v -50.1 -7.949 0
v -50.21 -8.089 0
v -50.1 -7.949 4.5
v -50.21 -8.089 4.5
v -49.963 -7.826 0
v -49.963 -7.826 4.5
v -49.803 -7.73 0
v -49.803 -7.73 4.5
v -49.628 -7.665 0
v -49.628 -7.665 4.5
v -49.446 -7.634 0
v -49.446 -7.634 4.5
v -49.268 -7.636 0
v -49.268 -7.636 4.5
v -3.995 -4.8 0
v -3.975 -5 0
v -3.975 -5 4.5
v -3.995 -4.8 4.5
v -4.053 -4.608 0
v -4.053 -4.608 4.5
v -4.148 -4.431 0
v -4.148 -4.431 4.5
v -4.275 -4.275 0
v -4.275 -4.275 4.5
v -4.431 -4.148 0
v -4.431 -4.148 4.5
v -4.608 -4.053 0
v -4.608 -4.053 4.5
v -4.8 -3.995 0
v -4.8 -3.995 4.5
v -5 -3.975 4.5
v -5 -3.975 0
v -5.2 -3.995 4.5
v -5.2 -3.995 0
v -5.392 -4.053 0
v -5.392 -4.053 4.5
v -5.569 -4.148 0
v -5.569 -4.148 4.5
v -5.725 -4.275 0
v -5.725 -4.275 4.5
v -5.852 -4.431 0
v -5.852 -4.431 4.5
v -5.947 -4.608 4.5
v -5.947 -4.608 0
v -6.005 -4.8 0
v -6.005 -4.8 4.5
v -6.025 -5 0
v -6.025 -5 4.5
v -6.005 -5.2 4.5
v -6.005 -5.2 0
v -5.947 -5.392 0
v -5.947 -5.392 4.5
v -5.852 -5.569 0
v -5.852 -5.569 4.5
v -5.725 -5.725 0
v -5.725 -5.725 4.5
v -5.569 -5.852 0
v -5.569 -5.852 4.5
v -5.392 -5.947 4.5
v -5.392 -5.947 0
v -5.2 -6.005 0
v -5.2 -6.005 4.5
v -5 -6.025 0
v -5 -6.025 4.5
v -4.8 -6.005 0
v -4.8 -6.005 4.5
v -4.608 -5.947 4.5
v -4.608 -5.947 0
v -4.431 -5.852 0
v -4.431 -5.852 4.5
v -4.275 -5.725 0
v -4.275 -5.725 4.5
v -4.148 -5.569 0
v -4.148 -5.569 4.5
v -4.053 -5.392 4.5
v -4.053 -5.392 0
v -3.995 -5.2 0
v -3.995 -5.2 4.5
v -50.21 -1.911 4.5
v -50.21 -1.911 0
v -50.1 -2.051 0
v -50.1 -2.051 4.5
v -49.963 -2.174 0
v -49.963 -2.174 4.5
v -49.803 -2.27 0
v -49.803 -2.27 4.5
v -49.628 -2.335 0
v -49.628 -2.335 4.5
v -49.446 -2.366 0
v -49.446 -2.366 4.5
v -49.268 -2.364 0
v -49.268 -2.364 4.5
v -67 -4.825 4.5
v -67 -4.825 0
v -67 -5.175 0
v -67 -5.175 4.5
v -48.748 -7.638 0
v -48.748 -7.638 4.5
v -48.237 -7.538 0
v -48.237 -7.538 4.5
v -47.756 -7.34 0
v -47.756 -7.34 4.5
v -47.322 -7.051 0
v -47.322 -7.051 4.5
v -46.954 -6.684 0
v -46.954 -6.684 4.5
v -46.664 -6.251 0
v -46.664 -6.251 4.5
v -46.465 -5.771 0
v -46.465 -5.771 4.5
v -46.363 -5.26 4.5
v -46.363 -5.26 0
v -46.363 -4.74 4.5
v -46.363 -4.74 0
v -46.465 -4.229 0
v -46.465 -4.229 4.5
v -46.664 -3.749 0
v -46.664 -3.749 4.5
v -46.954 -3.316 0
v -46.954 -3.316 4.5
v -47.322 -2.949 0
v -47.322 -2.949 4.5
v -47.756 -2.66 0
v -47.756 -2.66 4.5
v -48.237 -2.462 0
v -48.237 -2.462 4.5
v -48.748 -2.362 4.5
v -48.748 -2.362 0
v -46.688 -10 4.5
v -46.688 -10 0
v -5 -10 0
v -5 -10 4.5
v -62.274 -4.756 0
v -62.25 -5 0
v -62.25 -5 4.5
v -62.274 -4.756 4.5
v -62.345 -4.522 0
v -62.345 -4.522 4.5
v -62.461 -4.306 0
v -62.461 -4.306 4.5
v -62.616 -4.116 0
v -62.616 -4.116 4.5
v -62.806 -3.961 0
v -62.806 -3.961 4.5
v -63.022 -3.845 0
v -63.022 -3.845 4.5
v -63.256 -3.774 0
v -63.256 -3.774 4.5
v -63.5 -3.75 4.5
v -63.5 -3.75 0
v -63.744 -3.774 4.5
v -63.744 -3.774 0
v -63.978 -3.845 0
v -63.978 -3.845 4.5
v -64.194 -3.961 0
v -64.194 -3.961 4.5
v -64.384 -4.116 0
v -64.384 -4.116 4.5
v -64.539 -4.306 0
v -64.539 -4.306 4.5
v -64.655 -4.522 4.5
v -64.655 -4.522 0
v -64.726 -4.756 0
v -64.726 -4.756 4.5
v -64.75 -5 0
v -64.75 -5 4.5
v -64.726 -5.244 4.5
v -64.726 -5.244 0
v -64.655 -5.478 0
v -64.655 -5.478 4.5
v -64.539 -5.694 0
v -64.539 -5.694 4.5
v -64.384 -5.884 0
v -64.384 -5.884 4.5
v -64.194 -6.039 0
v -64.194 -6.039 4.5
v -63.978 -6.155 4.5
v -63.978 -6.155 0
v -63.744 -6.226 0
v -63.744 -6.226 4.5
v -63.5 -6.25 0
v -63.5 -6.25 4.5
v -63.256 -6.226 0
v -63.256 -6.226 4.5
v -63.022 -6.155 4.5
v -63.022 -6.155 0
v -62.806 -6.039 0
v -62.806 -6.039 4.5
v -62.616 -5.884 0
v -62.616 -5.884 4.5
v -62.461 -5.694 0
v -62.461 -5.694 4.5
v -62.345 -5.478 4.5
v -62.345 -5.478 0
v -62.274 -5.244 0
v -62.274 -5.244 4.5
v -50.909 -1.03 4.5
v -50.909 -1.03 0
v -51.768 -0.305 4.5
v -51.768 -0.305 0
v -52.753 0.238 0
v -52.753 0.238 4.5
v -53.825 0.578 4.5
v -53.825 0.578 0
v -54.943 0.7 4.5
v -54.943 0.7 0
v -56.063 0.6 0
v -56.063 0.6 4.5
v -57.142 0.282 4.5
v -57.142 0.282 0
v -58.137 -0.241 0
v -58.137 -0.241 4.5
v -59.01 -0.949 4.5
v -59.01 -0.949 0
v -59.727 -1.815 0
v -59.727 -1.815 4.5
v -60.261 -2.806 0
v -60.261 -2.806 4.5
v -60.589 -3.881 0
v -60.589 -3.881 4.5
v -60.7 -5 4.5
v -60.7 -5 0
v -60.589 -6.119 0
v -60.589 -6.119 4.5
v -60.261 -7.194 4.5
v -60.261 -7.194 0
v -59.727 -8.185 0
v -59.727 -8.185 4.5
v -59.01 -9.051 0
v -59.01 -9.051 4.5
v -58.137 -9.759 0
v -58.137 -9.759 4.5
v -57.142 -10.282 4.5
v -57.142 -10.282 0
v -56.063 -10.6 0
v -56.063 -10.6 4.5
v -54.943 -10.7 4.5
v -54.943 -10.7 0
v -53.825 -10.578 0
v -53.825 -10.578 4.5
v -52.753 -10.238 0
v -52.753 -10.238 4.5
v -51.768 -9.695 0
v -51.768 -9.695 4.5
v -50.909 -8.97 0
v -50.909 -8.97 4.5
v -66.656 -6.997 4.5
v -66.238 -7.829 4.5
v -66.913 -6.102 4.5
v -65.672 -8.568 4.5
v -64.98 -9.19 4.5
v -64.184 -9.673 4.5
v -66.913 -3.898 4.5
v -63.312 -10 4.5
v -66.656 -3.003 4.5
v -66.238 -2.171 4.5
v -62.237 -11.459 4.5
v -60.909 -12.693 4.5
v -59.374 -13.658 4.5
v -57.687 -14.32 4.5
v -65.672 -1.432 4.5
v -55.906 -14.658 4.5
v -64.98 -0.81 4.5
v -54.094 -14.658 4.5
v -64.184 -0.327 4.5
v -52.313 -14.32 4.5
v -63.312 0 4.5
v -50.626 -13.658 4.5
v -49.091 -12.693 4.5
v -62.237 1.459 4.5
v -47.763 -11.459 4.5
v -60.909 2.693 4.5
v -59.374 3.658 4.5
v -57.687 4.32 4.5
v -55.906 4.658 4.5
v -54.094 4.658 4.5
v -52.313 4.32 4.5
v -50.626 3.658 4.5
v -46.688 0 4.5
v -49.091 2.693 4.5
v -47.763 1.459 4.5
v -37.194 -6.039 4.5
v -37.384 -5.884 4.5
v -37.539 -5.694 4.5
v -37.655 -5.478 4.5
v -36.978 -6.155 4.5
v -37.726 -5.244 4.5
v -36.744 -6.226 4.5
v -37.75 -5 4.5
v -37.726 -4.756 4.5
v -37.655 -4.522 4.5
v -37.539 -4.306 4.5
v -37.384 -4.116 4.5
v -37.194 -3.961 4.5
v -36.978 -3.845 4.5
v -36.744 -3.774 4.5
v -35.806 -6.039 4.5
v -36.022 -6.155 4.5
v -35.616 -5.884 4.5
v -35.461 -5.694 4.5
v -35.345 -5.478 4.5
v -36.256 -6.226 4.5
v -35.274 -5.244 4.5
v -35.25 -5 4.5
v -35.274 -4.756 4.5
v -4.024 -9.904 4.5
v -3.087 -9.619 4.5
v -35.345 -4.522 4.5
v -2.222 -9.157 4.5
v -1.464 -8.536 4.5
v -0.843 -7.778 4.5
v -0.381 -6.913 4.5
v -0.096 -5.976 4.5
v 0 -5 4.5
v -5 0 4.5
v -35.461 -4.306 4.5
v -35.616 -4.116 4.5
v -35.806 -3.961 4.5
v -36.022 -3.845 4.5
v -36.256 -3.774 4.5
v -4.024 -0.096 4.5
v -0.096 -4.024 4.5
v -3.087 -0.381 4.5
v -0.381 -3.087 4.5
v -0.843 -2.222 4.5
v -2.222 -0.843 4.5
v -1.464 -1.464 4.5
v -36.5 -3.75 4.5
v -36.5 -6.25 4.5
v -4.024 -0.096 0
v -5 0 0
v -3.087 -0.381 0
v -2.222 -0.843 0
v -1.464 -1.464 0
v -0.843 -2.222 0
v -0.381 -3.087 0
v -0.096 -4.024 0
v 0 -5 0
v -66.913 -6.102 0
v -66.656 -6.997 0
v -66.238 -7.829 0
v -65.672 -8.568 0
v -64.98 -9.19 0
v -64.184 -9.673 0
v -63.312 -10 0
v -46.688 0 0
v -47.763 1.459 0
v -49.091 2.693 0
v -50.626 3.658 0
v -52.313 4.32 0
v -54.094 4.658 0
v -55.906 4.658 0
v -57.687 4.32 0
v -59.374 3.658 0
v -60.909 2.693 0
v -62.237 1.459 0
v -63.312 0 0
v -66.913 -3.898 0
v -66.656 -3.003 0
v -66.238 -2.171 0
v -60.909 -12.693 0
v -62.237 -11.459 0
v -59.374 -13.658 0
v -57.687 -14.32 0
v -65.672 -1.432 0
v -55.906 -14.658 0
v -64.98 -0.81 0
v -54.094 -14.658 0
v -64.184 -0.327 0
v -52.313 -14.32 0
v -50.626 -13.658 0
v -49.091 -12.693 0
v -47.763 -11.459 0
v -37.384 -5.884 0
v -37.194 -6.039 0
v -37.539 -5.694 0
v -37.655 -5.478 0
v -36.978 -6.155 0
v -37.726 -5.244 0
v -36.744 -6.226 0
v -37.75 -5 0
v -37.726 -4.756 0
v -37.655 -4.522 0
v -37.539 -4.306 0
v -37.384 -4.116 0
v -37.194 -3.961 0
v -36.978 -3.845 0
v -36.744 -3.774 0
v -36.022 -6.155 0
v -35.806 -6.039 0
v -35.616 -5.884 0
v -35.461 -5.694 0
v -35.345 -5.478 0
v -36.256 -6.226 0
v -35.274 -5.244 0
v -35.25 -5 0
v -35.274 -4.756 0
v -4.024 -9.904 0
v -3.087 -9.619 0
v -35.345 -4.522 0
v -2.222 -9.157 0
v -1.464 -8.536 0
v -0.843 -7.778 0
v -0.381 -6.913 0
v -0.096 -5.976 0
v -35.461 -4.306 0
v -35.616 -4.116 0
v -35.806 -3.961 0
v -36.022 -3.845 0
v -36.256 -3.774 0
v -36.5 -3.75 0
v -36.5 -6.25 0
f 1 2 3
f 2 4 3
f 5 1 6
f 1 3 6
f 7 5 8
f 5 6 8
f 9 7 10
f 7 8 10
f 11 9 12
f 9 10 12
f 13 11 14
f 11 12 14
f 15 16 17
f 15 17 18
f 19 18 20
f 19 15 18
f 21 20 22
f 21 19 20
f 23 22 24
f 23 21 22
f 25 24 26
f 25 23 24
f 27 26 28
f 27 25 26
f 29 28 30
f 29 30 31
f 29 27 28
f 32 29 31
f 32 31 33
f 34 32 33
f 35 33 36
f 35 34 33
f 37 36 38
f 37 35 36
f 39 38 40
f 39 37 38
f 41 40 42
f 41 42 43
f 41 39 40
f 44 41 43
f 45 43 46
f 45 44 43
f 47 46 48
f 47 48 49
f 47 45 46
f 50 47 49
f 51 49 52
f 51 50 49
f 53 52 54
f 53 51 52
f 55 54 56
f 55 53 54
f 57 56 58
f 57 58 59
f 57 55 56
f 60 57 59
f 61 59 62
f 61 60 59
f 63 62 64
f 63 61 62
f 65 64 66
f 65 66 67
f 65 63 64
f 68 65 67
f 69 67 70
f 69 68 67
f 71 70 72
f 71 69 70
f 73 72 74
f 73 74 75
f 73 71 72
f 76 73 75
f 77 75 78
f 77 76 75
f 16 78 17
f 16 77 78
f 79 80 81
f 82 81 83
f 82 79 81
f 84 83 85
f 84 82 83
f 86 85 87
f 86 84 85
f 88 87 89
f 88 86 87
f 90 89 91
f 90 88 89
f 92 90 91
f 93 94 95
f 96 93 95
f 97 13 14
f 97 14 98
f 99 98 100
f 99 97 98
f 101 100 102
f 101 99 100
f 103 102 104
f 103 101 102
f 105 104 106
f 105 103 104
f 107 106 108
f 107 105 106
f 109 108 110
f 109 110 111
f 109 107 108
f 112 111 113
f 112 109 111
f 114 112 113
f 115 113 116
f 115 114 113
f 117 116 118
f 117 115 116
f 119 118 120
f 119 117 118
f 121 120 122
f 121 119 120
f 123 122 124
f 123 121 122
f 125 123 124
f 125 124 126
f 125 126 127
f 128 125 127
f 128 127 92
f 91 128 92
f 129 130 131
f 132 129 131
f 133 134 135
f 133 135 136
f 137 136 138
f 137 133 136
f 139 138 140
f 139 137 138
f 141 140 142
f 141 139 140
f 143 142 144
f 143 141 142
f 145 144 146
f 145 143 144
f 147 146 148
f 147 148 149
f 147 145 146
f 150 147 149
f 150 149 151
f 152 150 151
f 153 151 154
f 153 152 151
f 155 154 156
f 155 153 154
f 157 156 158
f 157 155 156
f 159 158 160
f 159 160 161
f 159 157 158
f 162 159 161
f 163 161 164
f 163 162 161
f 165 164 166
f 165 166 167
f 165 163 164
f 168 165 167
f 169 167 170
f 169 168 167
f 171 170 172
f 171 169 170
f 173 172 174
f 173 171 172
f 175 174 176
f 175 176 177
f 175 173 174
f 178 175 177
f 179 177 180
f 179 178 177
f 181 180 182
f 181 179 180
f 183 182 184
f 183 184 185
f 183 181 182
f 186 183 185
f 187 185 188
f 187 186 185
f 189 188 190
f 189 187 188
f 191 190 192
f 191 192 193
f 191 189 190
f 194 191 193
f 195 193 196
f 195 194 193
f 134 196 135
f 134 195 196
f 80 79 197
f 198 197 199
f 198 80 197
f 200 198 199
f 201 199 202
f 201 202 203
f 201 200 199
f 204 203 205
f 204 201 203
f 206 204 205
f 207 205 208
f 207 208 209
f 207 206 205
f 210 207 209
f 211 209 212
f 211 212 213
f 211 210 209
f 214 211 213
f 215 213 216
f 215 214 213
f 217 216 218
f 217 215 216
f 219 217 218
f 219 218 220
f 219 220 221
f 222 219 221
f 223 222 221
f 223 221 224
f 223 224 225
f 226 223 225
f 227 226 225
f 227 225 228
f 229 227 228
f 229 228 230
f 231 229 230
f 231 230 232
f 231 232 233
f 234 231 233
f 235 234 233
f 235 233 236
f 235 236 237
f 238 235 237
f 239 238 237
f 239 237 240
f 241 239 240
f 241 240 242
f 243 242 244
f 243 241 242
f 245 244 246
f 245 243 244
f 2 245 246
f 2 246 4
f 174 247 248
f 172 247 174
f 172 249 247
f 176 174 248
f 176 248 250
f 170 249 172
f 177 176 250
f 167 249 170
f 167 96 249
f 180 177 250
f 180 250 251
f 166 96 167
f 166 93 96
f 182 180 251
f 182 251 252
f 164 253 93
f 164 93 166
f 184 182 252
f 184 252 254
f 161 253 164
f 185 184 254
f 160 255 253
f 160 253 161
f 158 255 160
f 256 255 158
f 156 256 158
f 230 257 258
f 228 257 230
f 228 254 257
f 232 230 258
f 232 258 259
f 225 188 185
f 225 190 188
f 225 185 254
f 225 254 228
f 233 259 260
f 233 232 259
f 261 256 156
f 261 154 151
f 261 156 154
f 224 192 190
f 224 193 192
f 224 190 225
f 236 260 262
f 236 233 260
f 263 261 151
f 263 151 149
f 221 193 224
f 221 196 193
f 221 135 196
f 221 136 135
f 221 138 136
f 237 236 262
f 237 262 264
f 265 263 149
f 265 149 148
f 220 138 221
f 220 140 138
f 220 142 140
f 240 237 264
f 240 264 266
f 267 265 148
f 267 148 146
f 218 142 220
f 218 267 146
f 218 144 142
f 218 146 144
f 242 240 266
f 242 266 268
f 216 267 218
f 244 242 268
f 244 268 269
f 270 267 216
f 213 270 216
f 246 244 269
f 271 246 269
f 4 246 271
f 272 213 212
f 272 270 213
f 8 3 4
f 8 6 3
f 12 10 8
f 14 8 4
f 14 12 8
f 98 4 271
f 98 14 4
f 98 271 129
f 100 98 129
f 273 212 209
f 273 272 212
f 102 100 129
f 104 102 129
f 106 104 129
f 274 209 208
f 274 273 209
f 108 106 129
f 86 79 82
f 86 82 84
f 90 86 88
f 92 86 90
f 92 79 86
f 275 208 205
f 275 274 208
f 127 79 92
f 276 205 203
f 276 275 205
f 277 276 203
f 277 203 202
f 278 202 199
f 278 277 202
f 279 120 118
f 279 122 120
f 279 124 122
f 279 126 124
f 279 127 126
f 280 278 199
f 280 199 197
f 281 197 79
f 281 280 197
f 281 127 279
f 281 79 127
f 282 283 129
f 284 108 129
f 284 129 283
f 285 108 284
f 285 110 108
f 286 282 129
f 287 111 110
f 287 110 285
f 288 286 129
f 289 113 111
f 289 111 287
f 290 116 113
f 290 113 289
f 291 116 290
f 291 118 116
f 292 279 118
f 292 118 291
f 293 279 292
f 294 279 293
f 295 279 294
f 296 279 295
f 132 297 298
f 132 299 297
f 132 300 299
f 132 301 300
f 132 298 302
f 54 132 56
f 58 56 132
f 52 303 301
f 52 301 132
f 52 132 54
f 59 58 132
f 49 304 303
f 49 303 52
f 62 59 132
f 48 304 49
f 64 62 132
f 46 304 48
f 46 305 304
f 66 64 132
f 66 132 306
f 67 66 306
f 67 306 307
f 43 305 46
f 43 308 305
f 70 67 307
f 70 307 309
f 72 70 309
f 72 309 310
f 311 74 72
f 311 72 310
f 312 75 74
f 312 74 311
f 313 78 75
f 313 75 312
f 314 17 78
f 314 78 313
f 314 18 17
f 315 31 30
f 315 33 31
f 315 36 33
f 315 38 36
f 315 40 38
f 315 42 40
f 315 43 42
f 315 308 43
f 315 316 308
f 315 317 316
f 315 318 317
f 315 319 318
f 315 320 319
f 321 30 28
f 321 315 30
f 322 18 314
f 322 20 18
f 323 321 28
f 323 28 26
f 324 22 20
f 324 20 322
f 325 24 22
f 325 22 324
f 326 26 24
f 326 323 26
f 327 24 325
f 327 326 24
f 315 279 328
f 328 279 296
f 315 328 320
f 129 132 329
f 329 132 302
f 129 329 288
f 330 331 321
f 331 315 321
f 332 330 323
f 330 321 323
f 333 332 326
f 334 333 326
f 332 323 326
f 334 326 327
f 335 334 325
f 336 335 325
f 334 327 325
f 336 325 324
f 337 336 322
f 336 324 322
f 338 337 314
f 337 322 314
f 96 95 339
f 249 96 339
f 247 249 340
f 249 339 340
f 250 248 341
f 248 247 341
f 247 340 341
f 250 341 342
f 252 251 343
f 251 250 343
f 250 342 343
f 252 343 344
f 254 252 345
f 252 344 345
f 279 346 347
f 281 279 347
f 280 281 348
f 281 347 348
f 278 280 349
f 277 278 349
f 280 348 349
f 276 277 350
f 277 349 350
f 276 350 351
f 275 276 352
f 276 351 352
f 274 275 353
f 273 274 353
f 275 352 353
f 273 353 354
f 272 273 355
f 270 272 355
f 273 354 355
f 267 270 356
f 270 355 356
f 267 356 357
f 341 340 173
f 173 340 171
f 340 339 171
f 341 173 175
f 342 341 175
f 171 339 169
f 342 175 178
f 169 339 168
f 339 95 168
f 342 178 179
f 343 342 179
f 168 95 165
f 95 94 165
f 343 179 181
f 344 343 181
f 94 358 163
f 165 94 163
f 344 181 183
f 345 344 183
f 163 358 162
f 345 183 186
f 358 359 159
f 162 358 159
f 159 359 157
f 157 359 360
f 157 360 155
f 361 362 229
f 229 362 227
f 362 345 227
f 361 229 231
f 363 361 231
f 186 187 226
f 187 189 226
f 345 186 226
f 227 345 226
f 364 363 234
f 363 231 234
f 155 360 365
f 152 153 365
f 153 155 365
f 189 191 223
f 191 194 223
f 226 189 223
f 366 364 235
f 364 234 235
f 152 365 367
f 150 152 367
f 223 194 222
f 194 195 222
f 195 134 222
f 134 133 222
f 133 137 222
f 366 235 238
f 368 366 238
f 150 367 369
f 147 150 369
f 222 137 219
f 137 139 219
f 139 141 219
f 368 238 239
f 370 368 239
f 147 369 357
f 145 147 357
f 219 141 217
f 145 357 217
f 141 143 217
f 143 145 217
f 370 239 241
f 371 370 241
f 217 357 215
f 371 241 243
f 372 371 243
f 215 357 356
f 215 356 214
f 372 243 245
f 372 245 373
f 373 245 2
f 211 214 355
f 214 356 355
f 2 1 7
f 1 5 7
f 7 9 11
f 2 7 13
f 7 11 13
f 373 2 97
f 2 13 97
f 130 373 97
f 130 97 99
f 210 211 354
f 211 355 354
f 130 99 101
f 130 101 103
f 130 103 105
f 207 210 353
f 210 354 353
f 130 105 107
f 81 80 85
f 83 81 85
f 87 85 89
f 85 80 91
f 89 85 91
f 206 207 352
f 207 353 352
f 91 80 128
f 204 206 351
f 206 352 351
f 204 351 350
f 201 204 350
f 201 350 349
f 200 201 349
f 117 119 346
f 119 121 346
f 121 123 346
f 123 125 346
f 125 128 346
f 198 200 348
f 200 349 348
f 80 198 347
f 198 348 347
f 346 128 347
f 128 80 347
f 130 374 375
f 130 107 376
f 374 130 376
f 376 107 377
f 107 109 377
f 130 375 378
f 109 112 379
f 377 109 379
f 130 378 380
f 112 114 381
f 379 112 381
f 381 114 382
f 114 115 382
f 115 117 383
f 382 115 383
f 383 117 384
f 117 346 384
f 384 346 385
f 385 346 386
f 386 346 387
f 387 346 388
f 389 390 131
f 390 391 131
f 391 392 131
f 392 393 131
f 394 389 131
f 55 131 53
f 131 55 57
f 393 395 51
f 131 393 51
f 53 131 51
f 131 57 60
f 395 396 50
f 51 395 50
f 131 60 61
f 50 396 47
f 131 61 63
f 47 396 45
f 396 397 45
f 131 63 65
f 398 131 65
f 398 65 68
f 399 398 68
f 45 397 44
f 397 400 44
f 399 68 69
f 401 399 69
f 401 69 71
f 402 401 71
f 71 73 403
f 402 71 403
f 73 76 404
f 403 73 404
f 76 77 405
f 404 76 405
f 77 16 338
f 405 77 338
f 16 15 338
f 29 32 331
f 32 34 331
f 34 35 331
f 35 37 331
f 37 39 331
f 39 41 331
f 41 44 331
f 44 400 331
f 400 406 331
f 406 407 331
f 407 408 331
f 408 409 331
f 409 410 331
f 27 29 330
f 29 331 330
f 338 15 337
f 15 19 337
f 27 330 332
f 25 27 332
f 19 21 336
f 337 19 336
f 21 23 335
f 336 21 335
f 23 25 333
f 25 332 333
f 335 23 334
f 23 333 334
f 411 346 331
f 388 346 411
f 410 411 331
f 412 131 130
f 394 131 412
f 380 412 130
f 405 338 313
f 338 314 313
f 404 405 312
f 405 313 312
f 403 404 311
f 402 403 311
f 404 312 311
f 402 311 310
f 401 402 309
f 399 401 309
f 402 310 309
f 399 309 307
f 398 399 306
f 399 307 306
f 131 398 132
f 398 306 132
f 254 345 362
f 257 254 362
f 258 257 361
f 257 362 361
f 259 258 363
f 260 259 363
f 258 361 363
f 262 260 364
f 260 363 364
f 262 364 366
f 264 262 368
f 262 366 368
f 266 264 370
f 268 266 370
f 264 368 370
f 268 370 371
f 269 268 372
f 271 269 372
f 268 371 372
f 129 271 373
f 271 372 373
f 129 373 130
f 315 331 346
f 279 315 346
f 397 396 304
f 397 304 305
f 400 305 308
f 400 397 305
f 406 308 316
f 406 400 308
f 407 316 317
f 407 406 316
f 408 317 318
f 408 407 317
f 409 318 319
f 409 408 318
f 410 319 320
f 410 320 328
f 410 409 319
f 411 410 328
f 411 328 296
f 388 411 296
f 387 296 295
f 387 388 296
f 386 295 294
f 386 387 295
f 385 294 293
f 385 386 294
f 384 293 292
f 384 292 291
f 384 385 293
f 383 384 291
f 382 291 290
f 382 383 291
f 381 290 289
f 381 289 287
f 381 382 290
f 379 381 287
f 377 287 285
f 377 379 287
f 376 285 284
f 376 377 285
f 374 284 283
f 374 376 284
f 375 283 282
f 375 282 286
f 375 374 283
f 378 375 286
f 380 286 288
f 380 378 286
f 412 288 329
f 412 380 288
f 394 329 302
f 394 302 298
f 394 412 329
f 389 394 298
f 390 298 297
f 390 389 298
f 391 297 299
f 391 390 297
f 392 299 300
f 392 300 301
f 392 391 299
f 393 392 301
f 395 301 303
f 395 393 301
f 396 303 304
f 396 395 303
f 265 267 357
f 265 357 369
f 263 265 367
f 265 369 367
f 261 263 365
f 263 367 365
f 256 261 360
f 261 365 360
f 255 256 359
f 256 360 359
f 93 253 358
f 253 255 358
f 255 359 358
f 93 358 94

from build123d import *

# Parameters (mm, degrees)
SKETCH_1_R      = 1.025
SKETCH_1_R_2    = 1.25
EXTRUDE_1_DEPTH = 4.5
FILLET_1_R      = 1
FILLET_2_R      = 5
FILLET_3_R      = 5


# Some blends are built 0.0001 mm under size
with BuildPart() as part:
    # 草图1 → 凸台-拉伸1 (new body)
    with BuildSketch(Plane.XY):
        with BuildLine():
            Line((-63.312039461, 0), (-67, 0))
            Line((-67, 0), (-67, -10))
            Line((-67, -10), (-63.312039461, -10))
            ThreePointArc((-63.312039461, -10), (-55, -14.7), (-46.687960539, -10))
            Line((-46.687960539, -10), (0, -10))
            Line((0, -10), (0, 0))
            Line((0, 0), (-46.687960539, 0))
            ThreePointArc((-46.687960539, 0), (-55, 4.7), (-63.312039461, 0))
        make_face()
        with Locations((-5, -5)):
            Circle(SKETCH_1_R, mode=Mode.SUBTRACT)
        with Locations((-63.5, -5)):
            Circle(SKETCH_1_R_2, mode=Mode.SUBTRACT)
        with Locations((-36.5, -5)):
            Circle(SKETCH_1_R_2, mode=Mode.SUBTRACT)
        with BuildLine():
            ThreePointArc((-49.877708333, -2.49957442), (-60.7, -5), (-49.877708333, -7.50042558))
            ThreePointArc((-49.877708333, -7.50042558), (-46.35, -5), (-49.877708333, -2.49957442))
        make_face(mode=Mode.SUBTRACT)
    extrude(amount=EXTRUDE_1_DEPTH)

    # 圆角1
    fillet_1_edges = [part.edges().sort_by_distance(p)[0] for p in [
        (-49.877708333, -7.50042558, 2.25),
        (-49.877708333, -2.49957442, 2.25),
    ]]
    fillet(fillet_1_edges, radius=FILLET_1_R)

    # 圆角2
    fillet_2_edges = [part.edges().sort_by_distance(p)[0] for p in [
        (0, -10, 2.25),
        (0, 0, 2.25),
    ]]
    fillet(fillet_2_edges, radius=FILLET_2_R - 0.0001)  # a hair under: the kernel refuses the full size

    # 圆角3
    # the kernel refuses this fillet: 5 mm, written as the material it takes off along each edge
    with BuildSketch(Plane(origin=(-67, 0, -12.061963059), x_dir=(0, -1, 0), z_dir=(0, 0, 1))) as fillet_3_piece_1:
        with BuildLine():
            CenterArc((4.824785224, 5), FILLET_3_R, 195.212986046, 74.787013954)
            Line((0, 3.687960539), (-0.096495704, 3.66171975))
            ThreePointArc((-0.096495704, 3.66171975), (-0.1, 1.84398027), (-0.1, 0))
            Line((-0.1, 0), (0, -0.1))
            Line((0, -0.1), (4.824785224, -0.1))
            Line((4.824785224, -0.1), (4.824785224, 0))
        make_face()
    extrude(amount=28.623926118, mode=Mode.SUBTRACT)
    with BuildSketch(Plane(origin=(-67, -10, -12.061963059), x_dir=(1, 0, 0), z_dir=(0, 0, 1))) as fillet_3_piece_2:
        with BuildLine():
            CenterArc((5, 4.824785224), FILLET_3_R, 180, 74.787013954)
            Line((0, 4.824785224), (-0.1, 4.824785224))
            Line((-0.1, 4.824785224), (-0.1, 0))
            Line((-0.1, 0), (0, -0.1))
            ThreePointArc((0, -0.1), (1.84398027, -0.1), (3.66171975, -0.096495704))
            Line((3.66171975, -0.096495704), (3.687960539, 0))
        make_face()
    extrude(amount=28.623926118, mode=Mode.SUBTRACT)


solid = part.part
